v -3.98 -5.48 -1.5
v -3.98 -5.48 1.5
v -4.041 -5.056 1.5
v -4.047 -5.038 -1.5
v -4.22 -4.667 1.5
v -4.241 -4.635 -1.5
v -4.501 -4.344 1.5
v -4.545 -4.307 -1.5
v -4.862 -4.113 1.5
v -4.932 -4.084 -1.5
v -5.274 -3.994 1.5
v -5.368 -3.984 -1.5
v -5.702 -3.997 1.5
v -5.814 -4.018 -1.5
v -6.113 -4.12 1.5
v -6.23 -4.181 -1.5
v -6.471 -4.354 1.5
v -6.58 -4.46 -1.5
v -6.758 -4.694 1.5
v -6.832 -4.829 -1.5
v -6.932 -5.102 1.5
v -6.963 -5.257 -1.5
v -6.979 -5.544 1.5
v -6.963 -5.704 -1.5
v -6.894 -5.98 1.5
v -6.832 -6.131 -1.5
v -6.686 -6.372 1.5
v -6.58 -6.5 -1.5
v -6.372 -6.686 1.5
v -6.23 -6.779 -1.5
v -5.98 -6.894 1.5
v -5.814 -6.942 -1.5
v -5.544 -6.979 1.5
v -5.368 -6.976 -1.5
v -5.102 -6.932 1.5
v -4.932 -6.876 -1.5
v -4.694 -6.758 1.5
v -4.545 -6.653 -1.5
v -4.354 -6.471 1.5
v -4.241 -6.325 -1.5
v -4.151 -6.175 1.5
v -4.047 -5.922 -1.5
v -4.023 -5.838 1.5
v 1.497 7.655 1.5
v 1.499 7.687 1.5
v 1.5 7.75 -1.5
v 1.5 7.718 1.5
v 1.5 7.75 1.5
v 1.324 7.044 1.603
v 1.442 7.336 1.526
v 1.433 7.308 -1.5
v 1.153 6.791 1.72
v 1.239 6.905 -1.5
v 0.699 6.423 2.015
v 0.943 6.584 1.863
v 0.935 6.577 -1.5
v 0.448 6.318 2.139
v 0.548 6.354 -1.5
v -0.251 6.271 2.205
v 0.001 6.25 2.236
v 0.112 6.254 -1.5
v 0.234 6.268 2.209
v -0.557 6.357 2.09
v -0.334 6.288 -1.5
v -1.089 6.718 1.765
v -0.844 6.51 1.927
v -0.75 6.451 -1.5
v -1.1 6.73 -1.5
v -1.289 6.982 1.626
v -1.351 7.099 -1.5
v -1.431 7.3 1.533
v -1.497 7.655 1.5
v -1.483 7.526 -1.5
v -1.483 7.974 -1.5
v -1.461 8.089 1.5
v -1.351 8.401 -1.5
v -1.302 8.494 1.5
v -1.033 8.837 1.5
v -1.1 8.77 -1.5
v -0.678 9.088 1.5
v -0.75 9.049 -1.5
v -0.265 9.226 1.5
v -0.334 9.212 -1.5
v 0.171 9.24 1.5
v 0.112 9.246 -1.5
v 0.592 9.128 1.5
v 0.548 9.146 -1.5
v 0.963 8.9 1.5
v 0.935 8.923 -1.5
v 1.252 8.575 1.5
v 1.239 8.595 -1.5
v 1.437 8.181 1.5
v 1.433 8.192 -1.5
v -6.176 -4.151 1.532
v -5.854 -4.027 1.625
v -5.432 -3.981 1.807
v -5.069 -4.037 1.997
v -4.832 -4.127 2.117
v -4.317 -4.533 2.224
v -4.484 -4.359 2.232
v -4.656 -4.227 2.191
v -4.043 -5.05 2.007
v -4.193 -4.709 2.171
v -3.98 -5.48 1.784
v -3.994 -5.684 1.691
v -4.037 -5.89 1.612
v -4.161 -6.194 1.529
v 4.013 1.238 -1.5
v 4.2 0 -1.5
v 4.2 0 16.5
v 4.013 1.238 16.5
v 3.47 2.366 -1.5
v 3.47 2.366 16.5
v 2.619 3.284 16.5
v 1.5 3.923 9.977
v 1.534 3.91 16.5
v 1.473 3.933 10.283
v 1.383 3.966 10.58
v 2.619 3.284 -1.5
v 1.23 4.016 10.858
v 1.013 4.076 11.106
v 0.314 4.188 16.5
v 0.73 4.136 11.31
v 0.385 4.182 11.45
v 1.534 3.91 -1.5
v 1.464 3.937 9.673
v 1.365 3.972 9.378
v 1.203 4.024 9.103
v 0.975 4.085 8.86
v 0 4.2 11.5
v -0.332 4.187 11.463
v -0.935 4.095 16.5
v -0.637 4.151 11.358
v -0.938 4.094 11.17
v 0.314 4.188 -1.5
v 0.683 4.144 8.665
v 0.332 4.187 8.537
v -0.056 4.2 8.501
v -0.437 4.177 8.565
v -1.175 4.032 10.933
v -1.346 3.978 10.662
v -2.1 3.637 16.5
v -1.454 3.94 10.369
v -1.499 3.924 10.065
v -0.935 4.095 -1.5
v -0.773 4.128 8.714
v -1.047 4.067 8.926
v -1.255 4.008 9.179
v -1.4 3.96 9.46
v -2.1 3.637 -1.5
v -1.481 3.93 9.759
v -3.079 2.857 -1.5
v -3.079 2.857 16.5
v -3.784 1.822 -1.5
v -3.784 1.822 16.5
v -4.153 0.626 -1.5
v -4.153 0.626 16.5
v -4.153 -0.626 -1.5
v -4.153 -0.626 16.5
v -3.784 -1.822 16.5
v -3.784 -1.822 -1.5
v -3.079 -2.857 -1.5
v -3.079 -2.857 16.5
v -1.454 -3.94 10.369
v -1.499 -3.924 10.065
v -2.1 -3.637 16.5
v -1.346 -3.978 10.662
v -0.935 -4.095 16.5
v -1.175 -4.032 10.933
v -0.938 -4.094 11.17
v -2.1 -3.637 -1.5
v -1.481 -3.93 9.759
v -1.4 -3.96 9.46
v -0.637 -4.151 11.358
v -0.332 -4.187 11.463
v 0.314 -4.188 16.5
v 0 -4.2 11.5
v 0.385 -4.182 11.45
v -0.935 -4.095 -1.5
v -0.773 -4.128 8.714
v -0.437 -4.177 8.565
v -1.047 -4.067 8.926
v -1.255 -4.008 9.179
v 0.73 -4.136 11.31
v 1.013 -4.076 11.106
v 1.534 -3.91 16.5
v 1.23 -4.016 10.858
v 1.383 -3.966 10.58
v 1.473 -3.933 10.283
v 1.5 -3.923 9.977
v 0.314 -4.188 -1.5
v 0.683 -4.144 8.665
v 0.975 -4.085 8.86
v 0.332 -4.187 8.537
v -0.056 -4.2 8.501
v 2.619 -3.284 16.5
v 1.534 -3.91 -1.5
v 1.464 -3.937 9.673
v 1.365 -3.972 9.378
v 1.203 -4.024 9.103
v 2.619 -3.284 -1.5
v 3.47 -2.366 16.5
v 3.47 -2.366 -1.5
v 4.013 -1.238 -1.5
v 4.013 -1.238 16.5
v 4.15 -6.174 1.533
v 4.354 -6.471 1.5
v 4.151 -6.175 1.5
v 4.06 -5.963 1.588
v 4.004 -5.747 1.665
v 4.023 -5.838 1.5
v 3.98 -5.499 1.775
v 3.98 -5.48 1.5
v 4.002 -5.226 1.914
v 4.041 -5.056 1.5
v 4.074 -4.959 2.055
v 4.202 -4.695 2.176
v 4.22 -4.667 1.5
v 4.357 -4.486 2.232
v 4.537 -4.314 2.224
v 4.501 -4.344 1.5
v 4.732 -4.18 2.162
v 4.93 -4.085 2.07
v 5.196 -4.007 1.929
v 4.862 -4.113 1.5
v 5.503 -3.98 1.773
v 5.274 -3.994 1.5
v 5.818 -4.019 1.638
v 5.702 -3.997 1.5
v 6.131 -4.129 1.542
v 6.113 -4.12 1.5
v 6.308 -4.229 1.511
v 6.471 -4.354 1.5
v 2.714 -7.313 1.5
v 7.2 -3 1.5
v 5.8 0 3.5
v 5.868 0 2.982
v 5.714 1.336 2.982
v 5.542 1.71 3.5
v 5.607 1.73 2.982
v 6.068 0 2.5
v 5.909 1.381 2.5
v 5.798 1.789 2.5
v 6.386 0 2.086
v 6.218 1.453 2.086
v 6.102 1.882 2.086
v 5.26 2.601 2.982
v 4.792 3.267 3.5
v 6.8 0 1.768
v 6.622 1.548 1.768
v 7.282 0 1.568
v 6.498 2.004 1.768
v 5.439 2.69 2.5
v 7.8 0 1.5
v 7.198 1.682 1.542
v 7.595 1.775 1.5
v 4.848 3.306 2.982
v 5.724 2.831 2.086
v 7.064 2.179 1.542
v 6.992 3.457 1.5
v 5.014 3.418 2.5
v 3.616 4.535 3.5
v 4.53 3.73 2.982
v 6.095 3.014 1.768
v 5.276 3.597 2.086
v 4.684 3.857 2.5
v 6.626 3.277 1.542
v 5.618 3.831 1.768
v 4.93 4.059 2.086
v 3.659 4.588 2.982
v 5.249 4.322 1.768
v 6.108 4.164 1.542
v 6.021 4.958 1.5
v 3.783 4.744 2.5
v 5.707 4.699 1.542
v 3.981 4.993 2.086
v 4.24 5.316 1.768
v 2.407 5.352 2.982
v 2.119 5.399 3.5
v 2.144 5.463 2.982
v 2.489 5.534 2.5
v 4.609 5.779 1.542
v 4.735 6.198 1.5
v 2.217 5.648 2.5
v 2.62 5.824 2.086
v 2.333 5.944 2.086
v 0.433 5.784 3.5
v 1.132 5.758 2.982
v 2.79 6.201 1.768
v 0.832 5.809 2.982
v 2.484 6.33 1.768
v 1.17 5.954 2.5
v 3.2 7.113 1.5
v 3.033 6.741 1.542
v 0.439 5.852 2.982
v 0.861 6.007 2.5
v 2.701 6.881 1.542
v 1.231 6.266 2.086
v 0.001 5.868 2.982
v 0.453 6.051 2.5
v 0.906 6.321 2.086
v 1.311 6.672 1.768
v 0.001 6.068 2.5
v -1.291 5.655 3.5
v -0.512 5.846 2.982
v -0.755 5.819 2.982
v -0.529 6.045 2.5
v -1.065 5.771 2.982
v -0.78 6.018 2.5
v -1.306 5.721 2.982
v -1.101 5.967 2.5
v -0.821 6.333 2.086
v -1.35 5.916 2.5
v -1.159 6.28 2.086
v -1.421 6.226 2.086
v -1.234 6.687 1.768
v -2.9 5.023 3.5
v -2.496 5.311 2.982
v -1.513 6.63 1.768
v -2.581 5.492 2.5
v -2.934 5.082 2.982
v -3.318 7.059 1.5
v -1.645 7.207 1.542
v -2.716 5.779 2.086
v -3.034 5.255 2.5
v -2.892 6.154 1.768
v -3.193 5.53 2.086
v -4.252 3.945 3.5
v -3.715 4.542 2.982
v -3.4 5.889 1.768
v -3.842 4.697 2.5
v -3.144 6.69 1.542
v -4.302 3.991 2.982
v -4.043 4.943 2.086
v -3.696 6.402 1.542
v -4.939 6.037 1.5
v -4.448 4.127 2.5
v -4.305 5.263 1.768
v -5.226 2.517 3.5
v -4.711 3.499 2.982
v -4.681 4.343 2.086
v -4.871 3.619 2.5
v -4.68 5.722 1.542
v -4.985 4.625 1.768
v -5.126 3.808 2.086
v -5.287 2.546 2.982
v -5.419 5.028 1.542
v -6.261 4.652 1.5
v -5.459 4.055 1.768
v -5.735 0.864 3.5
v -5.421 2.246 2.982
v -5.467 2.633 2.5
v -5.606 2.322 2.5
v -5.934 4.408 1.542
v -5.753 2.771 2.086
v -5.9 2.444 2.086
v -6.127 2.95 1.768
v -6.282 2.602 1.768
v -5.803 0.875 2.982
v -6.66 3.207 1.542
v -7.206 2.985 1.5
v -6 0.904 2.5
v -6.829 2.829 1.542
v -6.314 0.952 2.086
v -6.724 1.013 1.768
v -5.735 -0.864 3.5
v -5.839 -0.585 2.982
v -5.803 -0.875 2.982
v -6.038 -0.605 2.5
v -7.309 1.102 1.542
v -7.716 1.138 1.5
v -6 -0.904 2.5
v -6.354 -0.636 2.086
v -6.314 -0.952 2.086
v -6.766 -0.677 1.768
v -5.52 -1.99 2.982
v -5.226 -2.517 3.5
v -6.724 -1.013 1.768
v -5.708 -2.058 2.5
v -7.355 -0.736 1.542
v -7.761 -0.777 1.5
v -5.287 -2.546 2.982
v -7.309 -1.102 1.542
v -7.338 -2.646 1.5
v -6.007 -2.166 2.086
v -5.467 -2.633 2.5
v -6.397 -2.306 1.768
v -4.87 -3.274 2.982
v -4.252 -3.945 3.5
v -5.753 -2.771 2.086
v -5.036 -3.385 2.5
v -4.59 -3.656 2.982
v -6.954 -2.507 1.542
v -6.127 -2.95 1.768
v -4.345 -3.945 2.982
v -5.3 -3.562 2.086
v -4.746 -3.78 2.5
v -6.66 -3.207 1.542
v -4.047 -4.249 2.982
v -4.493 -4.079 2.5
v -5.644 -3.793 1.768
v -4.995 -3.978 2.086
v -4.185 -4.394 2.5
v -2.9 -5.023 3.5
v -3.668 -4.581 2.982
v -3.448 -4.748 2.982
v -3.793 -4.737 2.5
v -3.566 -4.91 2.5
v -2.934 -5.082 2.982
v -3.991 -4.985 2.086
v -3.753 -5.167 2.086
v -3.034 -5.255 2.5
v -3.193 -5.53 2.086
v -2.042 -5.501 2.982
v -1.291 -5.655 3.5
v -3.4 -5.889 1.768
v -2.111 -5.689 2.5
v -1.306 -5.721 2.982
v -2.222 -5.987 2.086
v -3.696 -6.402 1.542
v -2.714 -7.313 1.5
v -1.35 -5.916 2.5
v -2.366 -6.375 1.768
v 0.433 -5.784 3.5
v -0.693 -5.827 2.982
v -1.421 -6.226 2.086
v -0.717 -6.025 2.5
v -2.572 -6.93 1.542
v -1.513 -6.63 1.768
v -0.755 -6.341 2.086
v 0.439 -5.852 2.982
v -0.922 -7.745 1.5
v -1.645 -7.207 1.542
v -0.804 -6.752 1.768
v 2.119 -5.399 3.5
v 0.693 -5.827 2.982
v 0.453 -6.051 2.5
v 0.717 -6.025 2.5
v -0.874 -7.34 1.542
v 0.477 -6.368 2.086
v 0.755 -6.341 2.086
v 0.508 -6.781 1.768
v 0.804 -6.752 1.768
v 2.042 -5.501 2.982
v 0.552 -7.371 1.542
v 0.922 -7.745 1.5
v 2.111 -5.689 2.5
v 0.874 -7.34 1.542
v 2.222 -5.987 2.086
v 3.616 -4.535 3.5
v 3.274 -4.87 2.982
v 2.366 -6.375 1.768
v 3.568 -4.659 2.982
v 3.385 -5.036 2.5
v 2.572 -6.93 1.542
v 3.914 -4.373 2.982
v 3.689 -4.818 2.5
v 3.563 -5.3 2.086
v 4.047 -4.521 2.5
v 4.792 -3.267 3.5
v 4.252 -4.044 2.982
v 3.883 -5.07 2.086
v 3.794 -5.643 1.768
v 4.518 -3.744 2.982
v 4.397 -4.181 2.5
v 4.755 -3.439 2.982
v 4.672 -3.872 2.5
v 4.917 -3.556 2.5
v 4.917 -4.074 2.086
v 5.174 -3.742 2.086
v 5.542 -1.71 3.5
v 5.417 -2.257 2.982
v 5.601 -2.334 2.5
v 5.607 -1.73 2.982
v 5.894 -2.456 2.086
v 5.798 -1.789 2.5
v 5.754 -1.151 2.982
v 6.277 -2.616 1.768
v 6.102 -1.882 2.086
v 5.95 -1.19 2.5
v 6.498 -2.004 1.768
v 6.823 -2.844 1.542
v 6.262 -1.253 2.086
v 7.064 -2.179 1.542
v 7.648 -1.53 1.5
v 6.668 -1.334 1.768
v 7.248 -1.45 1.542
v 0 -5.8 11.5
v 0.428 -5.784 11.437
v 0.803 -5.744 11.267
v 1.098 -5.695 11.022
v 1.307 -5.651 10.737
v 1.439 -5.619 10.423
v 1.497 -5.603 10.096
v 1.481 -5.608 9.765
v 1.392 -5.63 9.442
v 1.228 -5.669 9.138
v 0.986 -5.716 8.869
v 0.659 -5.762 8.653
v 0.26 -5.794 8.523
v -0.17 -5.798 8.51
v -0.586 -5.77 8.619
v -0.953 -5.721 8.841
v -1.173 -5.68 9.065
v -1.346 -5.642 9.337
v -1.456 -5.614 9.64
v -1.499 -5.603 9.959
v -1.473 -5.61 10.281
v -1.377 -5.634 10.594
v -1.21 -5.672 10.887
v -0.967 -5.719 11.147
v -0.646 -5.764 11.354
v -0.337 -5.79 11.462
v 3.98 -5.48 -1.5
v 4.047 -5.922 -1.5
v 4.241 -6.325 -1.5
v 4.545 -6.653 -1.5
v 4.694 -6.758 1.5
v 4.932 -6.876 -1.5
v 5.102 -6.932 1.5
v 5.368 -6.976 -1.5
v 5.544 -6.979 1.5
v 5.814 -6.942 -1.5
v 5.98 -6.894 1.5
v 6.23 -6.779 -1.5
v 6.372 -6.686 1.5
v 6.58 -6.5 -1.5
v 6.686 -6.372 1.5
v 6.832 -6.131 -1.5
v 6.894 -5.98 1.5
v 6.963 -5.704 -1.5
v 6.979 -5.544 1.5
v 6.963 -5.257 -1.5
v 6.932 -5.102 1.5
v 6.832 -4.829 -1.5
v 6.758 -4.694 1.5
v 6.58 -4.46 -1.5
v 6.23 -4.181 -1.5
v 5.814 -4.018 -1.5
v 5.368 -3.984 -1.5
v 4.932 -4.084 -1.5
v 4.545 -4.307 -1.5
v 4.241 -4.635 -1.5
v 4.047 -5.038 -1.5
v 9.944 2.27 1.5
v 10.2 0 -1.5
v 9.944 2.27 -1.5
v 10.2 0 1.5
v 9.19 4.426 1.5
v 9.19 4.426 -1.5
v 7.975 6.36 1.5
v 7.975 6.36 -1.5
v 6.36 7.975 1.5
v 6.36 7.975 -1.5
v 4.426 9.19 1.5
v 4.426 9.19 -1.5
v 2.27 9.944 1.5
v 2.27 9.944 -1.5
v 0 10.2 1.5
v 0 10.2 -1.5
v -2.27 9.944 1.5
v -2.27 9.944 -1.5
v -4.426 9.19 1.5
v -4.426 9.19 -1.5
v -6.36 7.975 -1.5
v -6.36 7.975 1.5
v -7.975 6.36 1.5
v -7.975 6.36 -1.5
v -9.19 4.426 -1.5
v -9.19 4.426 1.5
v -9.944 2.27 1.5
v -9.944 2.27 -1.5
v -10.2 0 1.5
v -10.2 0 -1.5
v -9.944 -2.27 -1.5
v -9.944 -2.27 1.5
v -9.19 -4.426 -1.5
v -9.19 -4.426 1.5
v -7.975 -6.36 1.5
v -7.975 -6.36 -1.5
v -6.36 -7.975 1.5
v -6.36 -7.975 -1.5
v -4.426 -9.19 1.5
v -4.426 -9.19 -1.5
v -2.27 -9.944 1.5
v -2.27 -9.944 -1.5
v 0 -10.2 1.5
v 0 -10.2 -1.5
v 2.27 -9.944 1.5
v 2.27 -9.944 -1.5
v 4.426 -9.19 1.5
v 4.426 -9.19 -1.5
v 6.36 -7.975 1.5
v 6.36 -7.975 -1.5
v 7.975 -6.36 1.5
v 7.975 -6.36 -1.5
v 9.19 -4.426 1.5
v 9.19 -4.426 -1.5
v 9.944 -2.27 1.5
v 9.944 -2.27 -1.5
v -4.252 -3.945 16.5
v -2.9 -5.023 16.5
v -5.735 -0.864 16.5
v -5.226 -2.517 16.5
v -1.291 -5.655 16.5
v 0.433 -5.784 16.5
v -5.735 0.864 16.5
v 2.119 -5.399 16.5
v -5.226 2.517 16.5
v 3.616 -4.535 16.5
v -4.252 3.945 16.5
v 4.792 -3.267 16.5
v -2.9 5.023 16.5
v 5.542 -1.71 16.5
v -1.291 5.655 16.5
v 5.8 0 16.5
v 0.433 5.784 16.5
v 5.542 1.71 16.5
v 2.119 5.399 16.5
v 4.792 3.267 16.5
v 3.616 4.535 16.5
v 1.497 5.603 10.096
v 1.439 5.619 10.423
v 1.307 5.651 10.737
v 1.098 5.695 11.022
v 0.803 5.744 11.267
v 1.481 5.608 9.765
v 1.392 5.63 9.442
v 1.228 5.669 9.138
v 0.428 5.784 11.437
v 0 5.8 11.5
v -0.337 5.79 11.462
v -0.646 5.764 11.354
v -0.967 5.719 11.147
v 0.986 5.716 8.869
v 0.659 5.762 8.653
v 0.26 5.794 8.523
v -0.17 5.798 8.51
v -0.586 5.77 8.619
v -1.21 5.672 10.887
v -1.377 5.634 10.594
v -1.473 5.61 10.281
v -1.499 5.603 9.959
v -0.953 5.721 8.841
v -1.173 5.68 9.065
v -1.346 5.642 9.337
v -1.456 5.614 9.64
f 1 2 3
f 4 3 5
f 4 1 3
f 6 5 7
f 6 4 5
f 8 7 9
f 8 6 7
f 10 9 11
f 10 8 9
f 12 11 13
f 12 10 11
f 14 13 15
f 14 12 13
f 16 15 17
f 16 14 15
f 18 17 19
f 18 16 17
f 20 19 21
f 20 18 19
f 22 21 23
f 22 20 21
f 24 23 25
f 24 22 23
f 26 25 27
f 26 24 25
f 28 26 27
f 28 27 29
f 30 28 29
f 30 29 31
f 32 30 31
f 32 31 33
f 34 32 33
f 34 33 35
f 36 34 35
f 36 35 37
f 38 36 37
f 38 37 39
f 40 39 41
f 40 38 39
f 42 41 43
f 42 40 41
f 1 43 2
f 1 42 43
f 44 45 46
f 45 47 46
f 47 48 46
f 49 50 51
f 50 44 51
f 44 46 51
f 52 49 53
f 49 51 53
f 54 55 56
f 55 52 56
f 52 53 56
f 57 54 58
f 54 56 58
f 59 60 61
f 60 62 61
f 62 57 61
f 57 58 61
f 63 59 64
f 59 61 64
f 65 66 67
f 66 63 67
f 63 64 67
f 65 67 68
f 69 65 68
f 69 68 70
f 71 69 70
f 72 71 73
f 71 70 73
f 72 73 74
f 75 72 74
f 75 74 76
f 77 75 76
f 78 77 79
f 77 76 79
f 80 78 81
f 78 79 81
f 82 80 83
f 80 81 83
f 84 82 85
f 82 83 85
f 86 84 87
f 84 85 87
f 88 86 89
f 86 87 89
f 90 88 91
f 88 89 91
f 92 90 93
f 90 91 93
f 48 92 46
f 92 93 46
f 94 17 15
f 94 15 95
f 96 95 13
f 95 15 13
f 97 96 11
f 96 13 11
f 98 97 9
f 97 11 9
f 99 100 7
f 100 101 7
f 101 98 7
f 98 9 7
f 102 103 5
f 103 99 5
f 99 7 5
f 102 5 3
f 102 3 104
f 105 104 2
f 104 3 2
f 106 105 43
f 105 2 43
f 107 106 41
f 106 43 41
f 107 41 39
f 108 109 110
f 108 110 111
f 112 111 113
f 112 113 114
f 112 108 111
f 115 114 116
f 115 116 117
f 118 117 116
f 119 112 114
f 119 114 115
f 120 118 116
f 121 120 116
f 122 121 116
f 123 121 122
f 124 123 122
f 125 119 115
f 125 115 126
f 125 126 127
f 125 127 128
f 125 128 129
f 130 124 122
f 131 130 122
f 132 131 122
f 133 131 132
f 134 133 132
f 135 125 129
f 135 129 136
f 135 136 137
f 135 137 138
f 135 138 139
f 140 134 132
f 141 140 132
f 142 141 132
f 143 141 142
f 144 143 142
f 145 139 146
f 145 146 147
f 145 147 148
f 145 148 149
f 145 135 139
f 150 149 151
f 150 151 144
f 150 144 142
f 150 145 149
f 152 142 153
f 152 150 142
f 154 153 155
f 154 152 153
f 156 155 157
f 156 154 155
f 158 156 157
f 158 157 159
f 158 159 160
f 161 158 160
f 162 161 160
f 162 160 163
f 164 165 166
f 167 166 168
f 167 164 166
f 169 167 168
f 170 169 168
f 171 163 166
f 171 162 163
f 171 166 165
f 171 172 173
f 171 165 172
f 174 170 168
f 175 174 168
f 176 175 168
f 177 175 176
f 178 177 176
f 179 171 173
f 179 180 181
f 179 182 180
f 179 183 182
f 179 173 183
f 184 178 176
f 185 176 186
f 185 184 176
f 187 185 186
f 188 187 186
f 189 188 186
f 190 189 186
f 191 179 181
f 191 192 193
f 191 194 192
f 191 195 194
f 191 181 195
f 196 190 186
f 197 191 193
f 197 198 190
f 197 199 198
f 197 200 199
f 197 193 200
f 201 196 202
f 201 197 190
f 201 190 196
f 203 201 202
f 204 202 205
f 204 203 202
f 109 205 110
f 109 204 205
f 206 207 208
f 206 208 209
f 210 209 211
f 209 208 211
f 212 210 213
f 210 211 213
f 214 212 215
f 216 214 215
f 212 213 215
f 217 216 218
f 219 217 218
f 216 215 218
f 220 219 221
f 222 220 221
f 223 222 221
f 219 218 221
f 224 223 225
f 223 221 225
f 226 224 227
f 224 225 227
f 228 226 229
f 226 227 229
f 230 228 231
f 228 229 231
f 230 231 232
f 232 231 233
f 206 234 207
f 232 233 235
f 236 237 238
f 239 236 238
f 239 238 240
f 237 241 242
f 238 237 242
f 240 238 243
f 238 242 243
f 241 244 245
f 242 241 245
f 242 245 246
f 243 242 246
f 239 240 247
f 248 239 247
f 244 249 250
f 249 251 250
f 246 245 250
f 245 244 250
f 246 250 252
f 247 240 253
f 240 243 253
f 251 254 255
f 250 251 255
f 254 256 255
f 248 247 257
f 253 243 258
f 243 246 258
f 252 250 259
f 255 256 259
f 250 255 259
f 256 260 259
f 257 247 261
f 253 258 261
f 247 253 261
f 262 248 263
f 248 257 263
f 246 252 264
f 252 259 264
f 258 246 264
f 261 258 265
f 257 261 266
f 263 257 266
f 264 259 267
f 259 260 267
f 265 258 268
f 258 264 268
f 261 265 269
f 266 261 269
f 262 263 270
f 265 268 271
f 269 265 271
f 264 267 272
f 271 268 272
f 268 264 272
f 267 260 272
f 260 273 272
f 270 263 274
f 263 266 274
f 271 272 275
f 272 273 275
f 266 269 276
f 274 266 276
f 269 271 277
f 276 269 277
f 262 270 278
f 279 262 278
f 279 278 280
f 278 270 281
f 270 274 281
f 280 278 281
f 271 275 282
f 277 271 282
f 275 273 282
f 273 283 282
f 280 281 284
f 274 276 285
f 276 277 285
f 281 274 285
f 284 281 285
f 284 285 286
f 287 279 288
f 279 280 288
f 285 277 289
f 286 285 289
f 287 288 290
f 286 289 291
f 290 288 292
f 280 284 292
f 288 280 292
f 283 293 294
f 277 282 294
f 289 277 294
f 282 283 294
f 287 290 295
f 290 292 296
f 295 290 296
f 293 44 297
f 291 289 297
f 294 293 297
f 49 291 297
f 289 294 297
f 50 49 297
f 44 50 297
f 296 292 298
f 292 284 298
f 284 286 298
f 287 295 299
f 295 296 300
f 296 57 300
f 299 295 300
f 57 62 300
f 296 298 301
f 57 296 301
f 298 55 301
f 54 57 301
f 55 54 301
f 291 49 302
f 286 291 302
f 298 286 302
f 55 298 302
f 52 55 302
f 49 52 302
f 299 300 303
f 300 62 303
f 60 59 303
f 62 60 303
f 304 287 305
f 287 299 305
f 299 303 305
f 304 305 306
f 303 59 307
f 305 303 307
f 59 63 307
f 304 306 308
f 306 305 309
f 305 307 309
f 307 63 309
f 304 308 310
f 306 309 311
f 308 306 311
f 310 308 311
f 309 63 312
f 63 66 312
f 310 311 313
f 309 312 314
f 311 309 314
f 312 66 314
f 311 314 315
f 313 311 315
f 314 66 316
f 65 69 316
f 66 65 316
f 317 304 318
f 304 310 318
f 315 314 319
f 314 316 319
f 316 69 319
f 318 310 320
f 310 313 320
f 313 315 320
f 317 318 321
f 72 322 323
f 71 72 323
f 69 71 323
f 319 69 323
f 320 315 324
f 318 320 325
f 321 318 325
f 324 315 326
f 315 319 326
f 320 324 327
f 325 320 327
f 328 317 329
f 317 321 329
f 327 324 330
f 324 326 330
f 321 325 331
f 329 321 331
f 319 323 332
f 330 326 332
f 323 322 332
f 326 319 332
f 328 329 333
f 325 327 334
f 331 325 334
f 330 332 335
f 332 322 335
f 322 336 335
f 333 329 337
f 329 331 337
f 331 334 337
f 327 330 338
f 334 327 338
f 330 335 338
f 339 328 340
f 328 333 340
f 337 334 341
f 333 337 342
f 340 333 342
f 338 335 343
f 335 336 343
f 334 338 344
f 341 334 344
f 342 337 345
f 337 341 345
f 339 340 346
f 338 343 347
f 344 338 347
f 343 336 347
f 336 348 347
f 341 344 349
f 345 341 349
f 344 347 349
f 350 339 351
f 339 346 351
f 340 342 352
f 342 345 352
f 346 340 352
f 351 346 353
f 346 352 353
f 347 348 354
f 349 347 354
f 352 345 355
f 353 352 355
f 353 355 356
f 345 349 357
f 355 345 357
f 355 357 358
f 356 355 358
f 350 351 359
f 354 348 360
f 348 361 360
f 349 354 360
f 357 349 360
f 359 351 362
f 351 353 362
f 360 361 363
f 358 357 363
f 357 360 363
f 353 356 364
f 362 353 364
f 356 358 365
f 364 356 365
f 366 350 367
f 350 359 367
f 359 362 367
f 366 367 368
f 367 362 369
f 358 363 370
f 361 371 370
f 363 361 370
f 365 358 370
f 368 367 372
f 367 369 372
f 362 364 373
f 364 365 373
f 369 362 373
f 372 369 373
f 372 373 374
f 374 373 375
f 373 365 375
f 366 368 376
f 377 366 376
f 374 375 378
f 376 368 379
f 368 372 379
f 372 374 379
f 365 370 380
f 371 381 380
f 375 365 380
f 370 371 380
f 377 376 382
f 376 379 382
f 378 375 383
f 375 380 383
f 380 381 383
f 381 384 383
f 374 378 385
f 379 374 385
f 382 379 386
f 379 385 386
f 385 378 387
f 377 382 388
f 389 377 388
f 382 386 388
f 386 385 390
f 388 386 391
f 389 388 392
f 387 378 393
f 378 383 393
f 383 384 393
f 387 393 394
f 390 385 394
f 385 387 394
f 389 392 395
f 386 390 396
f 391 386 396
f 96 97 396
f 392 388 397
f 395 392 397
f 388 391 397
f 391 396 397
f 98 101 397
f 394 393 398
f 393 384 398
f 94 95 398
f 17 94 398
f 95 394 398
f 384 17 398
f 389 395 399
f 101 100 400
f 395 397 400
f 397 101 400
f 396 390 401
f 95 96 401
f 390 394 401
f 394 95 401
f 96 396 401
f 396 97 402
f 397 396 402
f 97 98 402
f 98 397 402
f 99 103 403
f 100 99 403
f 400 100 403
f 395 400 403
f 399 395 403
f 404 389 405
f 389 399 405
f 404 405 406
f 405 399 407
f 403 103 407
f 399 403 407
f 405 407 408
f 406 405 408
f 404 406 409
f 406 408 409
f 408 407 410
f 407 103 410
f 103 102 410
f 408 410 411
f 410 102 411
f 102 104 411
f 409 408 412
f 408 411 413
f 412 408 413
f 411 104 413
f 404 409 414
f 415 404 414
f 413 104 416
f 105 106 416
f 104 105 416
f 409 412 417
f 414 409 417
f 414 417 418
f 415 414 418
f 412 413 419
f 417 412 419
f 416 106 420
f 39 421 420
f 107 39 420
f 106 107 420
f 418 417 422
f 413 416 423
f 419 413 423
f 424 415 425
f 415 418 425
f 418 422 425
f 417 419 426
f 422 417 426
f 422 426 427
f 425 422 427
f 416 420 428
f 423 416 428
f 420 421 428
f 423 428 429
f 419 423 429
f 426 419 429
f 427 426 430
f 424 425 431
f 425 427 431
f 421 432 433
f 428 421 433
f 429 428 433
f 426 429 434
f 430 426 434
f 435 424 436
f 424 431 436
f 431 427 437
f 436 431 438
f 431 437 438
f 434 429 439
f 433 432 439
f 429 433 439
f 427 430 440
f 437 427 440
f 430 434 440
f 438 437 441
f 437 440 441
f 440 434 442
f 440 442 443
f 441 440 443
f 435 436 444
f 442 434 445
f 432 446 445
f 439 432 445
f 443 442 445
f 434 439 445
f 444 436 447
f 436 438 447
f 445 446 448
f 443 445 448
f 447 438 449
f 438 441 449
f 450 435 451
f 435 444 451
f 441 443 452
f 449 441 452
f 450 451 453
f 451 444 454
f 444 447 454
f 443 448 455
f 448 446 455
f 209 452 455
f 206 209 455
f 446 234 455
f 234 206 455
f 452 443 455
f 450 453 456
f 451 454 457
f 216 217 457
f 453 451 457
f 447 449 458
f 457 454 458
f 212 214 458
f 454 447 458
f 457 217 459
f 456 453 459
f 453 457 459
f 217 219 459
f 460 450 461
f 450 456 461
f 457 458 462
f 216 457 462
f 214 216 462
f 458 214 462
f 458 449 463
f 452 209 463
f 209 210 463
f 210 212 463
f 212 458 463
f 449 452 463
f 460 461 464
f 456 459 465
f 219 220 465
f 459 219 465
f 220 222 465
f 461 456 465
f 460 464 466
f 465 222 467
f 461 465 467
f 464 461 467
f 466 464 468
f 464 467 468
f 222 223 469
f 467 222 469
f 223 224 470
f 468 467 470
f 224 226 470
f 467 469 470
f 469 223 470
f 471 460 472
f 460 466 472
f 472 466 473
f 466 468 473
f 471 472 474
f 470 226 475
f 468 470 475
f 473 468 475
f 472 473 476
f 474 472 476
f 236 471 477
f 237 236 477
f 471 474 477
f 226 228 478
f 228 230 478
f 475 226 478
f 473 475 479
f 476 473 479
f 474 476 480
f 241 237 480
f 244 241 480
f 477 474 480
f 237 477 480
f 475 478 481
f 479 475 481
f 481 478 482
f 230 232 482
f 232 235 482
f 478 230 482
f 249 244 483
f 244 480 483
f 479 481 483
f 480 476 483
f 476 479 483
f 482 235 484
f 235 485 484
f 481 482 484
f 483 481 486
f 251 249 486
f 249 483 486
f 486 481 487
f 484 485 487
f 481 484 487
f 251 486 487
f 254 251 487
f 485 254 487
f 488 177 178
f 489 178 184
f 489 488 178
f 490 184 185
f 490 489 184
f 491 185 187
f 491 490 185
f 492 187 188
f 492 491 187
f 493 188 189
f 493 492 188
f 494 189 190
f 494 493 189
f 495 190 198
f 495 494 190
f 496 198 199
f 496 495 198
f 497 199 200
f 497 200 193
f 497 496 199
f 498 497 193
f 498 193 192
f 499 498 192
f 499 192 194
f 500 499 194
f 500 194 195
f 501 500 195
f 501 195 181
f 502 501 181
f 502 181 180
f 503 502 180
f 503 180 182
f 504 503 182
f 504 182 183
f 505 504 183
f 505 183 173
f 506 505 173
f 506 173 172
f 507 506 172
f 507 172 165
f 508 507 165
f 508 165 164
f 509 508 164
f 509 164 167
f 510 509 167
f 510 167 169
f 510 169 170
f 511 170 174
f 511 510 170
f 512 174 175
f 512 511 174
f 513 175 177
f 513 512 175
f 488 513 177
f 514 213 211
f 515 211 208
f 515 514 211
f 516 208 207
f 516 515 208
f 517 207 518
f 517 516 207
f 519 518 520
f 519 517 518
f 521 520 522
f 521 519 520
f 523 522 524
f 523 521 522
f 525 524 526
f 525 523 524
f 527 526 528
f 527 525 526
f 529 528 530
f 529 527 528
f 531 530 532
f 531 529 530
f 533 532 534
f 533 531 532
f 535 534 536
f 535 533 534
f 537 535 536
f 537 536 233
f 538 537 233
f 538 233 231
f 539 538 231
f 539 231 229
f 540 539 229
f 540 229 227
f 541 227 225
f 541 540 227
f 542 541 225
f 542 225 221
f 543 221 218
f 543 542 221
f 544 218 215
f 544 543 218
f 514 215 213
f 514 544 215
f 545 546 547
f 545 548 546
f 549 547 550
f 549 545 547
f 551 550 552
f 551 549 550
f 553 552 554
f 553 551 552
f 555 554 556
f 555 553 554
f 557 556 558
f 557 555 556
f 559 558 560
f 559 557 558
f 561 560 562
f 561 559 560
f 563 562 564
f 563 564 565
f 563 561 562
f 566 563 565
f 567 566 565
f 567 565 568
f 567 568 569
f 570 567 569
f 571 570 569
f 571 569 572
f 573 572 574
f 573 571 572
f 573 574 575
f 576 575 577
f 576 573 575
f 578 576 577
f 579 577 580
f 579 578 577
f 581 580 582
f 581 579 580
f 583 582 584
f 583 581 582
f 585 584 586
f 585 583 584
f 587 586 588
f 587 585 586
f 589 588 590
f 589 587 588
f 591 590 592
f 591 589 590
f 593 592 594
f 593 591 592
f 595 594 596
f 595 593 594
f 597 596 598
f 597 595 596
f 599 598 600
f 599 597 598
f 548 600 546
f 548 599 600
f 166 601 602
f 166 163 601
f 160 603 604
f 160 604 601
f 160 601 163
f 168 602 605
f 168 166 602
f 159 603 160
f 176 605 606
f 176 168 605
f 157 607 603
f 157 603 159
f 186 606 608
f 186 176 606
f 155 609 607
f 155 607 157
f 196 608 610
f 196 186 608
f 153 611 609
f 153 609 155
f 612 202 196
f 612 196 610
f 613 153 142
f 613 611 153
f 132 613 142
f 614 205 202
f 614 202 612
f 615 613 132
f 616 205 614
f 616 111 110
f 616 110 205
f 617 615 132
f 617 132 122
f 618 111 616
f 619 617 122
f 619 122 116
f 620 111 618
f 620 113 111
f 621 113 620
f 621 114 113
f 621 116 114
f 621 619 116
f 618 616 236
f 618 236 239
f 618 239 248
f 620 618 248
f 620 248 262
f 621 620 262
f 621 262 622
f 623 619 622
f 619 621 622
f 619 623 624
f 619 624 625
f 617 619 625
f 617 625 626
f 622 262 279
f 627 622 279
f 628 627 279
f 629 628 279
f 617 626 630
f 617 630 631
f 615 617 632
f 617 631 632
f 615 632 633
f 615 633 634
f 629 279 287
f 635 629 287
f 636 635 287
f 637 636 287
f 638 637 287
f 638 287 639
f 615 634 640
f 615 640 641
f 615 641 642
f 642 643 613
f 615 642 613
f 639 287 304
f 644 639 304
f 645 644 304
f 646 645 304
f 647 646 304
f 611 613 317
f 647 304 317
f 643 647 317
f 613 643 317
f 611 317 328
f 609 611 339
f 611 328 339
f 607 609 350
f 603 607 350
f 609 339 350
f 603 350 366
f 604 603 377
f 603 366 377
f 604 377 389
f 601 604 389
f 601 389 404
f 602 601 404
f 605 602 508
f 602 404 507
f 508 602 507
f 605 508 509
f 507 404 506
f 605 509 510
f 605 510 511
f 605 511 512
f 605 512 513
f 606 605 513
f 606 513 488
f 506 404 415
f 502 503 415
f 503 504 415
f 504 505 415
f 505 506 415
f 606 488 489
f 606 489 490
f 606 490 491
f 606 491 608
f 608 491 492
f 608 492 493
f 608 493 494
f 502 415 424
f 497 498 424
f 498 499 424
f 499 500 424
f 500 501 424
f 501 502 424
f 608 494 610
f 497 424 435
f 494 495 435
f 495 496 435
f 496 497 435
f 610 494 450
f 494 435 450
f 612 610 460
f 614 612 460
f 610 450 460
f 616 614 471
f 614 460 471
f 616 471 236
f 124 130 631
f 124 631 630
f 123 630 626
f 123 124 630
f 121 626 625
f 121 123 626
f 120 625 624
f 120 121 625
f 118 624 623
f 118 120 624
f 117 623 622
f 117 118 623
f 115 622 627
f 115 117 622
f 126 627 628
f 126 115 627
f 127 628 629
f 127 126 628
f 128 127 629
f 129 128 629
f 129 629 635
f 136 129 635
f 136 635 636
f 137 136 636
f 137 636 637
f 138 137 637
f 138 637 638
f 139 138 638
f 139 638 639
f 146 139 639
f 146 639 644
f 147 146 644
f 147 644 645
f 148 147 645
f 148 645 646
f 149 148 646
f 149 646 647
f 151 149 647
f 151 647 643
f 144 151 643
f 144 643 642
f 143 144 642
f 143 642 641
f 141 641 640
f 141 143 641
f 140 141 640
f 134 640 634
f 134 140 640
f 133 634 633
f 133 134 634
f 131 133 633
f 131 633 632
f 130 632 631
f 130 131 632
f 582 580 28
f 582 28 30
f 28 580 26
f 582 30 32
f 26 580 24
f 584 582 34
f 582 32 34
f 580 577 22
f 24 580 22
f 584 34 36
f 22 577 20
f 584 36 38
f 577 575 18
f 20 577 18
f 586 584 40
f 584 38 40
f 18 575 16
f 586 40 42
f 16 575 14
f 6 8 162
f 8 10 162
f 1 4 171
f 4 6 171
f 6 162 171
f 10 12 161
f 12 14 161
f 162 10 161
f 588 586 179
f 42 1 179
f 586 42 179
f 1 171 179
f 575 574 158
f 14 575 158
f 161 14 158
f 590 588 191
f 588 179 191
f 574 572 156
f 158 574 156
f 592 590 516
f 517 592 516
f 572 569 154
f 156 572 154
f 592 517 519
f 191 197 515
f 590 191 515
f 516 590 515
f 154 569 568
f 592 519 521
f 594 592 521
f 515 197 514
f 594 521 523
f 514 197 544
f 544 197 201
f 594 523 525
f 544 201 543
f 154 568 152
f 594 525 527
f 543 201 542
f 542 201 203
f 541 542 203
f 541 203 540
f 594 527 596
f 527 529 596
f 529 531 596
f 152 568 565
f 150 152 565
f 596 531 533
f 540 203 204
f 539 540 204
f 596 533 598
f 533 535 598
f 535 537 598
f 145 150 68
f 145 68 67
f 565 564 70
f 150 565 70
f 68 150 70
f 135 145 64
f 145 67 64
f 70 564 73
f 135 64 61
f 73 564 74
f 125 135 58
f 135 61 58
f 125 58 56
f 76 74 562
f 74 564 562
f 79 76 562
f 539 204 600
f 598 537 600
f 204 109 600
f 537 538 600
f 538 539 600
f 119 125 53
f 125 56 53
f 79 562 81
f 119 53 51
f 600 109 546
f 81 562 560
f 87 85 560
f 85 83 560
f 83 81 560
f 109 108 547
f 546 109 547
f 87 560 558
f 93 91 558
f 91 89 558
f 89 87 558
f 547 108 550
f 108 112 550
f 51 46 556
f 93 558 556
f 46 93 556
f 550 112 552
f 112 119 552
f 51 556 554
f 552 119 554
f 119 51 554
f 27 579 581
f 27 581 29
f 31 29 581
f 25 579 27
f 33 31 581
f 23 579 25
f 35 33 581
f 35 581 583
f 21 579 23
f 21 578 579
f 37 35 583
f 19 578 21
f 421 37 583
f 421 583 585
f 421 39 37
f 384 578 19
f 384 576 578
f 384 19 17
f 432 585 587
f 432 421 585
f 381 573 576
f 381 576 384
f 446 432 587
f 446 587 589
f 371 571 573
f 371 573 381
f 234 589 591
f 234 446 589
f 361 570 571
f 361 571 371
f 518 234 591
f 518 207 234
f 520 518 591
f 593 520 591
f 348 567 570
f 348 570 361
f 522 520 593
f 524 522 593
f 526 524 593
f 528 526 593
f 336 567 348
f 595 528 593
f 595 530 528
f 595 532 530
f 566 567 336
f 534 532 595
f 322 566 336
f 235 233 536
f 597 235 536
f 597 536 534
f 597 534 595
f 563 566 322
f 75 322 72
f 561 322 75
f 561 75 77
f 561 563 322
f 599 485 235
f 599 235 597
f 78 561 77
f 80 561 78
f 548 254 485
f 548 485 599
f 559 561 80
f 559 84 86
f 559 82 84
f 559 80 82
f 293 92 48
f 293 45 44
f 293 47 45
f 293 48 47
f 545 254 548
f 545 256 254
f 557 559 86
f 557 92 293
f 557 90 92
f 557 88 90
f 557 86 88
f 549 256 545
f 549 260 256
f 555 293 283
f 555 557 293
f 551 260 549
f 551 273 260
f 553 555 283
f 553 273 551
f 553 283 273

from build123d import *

# Parameters (mm, degrees)
SKETCH_1_R               = 10.2
SKETCH_1_R_2             = 4.2
SKETCH_1_R_3             = 1.5
EXTRUDE_1_DEPTH          = 1.5
SKETCH_2_R               = 5.8
SKETCH_2_R_2             = 4.2
EXTRUDE_2_DEPTH          = 15
FILLET_1_R               = 2
CUT_EXTRUDE_1_DEPTH      = 22.916432191
CUT_EXTRUDE_1_DEPTH_BACK = 22.916432191
SKETCH_3_R               = 1.5


with BuildPart() as part:
    # Эскиз1 → Бобышка-Вытянуть1 (new, symmetric)
    with BuildSketch(Plane.XY):
        Circle(SKETCH_1_R)
        Circle(SKETCH_1_R_2, mode=Mode.SUBTRACT)
        with Locations((0, 7.75)):
            Circle(SKETCH_1_R_3, mode=Mode.SUBTRACT)
        with Locations((-5.480077554, -5.480077554)):
            Circle(SKETCH_1_R_3, mode=Mode.SUBTRACT)
        with Locations(Location((5.480077554, -5.480077554, 0), (0, 0, 180))):
            Circle(SKETCH_1_R_3, mode=Mode.SUBTRACT)
    extrude(amount=EXTRUDE_1_DEPTH, both=True)

    # Эскиз2 → Бобышка-Вытянуть2 (add)
    with BuildSketch(Plane.XY.offset(1.5)):
        Circle(SKETCH_2_R)
        Circle(SKETCH_2_R_2, mode=Mode.SUBTRACT)
    extrude(amount=EXTRUDE_2_DEPTH)

    # Скругление1
    # the kernel refuses this fillet: 2 mm, written as the material it adds along each edge
    with BuildSketch(Plane(origin=(0, 0, 1.5), x_dir=(1, 0, 0), z_dir=(0, -1, 0))) as fillet_1_piece_1_section:
        with BuildLine():
            CenterArc((5.8 + FILLET_1_R, FILLET_1_R), FILLET_1_R, 180, 90)
            Line((5.8, FILLET_1_R), (5.8, 0))
            Line((5.8, 0), (5.8 + FILLET_1_R, 0))
        make_face()
    fillet_1_piece_1 = revolve(axis=Axis((0, 0, 1.5), (0, 0, 1)), mode=Mode.PRIVATE)
    fillet_1_piece_1 = fillet_1_piece_1 - Plane(origin=(-5.480077554, -5.480077554, 2.062024649), x_dir=(1, 0, 0), z_dir=(0, 0, -1)) * Cylinder(1.5, 32, mode=Mode.PRIVATE)
    fillet_1_piece_1 = fillet_1_piece_1 - Plane(origin=(5.480077554, -5.480077554, 2.062024649), x_dir=(-1, 0, 0), z_dir=(0, 0, -1)) * Cylinder(1.5, 32, mode=Mode.PRIVATE)
    fillet_1_piece_1 = fillet_1_piece_1 - Plane(origin=(0, 7.75, 2.062024649), x_dir=(1, 0, 0), z_dir=(0, 0, -1)) * Cylinder(1.5, 32, mode=Mode.PRIVATE)
    add(fillet_1_piece_1)

    # Эскиз3 → Вырез-Вытянуть1 (cut, two sides: drawn at the far end of the back side and taken through both)
    with BuildSketch(Plane(origin=(0, 0, 0), x_dir=(1, 0, 0), z_dir=(0, 1, 0)).offset(-CUT_EXTRUDE_1_DEPTH_BACK)):
        with Locations(Location((0, -10, 0), (0, 0, 270))):
            Circle(SKETCH_3_R)
    extrude(amount=CUT_EXTRUDE_1_DEPTH + CUT_EXTRUDE_1_DEPTH_BACK, mode=Mode.SUBTRACT)


solid = part.part
